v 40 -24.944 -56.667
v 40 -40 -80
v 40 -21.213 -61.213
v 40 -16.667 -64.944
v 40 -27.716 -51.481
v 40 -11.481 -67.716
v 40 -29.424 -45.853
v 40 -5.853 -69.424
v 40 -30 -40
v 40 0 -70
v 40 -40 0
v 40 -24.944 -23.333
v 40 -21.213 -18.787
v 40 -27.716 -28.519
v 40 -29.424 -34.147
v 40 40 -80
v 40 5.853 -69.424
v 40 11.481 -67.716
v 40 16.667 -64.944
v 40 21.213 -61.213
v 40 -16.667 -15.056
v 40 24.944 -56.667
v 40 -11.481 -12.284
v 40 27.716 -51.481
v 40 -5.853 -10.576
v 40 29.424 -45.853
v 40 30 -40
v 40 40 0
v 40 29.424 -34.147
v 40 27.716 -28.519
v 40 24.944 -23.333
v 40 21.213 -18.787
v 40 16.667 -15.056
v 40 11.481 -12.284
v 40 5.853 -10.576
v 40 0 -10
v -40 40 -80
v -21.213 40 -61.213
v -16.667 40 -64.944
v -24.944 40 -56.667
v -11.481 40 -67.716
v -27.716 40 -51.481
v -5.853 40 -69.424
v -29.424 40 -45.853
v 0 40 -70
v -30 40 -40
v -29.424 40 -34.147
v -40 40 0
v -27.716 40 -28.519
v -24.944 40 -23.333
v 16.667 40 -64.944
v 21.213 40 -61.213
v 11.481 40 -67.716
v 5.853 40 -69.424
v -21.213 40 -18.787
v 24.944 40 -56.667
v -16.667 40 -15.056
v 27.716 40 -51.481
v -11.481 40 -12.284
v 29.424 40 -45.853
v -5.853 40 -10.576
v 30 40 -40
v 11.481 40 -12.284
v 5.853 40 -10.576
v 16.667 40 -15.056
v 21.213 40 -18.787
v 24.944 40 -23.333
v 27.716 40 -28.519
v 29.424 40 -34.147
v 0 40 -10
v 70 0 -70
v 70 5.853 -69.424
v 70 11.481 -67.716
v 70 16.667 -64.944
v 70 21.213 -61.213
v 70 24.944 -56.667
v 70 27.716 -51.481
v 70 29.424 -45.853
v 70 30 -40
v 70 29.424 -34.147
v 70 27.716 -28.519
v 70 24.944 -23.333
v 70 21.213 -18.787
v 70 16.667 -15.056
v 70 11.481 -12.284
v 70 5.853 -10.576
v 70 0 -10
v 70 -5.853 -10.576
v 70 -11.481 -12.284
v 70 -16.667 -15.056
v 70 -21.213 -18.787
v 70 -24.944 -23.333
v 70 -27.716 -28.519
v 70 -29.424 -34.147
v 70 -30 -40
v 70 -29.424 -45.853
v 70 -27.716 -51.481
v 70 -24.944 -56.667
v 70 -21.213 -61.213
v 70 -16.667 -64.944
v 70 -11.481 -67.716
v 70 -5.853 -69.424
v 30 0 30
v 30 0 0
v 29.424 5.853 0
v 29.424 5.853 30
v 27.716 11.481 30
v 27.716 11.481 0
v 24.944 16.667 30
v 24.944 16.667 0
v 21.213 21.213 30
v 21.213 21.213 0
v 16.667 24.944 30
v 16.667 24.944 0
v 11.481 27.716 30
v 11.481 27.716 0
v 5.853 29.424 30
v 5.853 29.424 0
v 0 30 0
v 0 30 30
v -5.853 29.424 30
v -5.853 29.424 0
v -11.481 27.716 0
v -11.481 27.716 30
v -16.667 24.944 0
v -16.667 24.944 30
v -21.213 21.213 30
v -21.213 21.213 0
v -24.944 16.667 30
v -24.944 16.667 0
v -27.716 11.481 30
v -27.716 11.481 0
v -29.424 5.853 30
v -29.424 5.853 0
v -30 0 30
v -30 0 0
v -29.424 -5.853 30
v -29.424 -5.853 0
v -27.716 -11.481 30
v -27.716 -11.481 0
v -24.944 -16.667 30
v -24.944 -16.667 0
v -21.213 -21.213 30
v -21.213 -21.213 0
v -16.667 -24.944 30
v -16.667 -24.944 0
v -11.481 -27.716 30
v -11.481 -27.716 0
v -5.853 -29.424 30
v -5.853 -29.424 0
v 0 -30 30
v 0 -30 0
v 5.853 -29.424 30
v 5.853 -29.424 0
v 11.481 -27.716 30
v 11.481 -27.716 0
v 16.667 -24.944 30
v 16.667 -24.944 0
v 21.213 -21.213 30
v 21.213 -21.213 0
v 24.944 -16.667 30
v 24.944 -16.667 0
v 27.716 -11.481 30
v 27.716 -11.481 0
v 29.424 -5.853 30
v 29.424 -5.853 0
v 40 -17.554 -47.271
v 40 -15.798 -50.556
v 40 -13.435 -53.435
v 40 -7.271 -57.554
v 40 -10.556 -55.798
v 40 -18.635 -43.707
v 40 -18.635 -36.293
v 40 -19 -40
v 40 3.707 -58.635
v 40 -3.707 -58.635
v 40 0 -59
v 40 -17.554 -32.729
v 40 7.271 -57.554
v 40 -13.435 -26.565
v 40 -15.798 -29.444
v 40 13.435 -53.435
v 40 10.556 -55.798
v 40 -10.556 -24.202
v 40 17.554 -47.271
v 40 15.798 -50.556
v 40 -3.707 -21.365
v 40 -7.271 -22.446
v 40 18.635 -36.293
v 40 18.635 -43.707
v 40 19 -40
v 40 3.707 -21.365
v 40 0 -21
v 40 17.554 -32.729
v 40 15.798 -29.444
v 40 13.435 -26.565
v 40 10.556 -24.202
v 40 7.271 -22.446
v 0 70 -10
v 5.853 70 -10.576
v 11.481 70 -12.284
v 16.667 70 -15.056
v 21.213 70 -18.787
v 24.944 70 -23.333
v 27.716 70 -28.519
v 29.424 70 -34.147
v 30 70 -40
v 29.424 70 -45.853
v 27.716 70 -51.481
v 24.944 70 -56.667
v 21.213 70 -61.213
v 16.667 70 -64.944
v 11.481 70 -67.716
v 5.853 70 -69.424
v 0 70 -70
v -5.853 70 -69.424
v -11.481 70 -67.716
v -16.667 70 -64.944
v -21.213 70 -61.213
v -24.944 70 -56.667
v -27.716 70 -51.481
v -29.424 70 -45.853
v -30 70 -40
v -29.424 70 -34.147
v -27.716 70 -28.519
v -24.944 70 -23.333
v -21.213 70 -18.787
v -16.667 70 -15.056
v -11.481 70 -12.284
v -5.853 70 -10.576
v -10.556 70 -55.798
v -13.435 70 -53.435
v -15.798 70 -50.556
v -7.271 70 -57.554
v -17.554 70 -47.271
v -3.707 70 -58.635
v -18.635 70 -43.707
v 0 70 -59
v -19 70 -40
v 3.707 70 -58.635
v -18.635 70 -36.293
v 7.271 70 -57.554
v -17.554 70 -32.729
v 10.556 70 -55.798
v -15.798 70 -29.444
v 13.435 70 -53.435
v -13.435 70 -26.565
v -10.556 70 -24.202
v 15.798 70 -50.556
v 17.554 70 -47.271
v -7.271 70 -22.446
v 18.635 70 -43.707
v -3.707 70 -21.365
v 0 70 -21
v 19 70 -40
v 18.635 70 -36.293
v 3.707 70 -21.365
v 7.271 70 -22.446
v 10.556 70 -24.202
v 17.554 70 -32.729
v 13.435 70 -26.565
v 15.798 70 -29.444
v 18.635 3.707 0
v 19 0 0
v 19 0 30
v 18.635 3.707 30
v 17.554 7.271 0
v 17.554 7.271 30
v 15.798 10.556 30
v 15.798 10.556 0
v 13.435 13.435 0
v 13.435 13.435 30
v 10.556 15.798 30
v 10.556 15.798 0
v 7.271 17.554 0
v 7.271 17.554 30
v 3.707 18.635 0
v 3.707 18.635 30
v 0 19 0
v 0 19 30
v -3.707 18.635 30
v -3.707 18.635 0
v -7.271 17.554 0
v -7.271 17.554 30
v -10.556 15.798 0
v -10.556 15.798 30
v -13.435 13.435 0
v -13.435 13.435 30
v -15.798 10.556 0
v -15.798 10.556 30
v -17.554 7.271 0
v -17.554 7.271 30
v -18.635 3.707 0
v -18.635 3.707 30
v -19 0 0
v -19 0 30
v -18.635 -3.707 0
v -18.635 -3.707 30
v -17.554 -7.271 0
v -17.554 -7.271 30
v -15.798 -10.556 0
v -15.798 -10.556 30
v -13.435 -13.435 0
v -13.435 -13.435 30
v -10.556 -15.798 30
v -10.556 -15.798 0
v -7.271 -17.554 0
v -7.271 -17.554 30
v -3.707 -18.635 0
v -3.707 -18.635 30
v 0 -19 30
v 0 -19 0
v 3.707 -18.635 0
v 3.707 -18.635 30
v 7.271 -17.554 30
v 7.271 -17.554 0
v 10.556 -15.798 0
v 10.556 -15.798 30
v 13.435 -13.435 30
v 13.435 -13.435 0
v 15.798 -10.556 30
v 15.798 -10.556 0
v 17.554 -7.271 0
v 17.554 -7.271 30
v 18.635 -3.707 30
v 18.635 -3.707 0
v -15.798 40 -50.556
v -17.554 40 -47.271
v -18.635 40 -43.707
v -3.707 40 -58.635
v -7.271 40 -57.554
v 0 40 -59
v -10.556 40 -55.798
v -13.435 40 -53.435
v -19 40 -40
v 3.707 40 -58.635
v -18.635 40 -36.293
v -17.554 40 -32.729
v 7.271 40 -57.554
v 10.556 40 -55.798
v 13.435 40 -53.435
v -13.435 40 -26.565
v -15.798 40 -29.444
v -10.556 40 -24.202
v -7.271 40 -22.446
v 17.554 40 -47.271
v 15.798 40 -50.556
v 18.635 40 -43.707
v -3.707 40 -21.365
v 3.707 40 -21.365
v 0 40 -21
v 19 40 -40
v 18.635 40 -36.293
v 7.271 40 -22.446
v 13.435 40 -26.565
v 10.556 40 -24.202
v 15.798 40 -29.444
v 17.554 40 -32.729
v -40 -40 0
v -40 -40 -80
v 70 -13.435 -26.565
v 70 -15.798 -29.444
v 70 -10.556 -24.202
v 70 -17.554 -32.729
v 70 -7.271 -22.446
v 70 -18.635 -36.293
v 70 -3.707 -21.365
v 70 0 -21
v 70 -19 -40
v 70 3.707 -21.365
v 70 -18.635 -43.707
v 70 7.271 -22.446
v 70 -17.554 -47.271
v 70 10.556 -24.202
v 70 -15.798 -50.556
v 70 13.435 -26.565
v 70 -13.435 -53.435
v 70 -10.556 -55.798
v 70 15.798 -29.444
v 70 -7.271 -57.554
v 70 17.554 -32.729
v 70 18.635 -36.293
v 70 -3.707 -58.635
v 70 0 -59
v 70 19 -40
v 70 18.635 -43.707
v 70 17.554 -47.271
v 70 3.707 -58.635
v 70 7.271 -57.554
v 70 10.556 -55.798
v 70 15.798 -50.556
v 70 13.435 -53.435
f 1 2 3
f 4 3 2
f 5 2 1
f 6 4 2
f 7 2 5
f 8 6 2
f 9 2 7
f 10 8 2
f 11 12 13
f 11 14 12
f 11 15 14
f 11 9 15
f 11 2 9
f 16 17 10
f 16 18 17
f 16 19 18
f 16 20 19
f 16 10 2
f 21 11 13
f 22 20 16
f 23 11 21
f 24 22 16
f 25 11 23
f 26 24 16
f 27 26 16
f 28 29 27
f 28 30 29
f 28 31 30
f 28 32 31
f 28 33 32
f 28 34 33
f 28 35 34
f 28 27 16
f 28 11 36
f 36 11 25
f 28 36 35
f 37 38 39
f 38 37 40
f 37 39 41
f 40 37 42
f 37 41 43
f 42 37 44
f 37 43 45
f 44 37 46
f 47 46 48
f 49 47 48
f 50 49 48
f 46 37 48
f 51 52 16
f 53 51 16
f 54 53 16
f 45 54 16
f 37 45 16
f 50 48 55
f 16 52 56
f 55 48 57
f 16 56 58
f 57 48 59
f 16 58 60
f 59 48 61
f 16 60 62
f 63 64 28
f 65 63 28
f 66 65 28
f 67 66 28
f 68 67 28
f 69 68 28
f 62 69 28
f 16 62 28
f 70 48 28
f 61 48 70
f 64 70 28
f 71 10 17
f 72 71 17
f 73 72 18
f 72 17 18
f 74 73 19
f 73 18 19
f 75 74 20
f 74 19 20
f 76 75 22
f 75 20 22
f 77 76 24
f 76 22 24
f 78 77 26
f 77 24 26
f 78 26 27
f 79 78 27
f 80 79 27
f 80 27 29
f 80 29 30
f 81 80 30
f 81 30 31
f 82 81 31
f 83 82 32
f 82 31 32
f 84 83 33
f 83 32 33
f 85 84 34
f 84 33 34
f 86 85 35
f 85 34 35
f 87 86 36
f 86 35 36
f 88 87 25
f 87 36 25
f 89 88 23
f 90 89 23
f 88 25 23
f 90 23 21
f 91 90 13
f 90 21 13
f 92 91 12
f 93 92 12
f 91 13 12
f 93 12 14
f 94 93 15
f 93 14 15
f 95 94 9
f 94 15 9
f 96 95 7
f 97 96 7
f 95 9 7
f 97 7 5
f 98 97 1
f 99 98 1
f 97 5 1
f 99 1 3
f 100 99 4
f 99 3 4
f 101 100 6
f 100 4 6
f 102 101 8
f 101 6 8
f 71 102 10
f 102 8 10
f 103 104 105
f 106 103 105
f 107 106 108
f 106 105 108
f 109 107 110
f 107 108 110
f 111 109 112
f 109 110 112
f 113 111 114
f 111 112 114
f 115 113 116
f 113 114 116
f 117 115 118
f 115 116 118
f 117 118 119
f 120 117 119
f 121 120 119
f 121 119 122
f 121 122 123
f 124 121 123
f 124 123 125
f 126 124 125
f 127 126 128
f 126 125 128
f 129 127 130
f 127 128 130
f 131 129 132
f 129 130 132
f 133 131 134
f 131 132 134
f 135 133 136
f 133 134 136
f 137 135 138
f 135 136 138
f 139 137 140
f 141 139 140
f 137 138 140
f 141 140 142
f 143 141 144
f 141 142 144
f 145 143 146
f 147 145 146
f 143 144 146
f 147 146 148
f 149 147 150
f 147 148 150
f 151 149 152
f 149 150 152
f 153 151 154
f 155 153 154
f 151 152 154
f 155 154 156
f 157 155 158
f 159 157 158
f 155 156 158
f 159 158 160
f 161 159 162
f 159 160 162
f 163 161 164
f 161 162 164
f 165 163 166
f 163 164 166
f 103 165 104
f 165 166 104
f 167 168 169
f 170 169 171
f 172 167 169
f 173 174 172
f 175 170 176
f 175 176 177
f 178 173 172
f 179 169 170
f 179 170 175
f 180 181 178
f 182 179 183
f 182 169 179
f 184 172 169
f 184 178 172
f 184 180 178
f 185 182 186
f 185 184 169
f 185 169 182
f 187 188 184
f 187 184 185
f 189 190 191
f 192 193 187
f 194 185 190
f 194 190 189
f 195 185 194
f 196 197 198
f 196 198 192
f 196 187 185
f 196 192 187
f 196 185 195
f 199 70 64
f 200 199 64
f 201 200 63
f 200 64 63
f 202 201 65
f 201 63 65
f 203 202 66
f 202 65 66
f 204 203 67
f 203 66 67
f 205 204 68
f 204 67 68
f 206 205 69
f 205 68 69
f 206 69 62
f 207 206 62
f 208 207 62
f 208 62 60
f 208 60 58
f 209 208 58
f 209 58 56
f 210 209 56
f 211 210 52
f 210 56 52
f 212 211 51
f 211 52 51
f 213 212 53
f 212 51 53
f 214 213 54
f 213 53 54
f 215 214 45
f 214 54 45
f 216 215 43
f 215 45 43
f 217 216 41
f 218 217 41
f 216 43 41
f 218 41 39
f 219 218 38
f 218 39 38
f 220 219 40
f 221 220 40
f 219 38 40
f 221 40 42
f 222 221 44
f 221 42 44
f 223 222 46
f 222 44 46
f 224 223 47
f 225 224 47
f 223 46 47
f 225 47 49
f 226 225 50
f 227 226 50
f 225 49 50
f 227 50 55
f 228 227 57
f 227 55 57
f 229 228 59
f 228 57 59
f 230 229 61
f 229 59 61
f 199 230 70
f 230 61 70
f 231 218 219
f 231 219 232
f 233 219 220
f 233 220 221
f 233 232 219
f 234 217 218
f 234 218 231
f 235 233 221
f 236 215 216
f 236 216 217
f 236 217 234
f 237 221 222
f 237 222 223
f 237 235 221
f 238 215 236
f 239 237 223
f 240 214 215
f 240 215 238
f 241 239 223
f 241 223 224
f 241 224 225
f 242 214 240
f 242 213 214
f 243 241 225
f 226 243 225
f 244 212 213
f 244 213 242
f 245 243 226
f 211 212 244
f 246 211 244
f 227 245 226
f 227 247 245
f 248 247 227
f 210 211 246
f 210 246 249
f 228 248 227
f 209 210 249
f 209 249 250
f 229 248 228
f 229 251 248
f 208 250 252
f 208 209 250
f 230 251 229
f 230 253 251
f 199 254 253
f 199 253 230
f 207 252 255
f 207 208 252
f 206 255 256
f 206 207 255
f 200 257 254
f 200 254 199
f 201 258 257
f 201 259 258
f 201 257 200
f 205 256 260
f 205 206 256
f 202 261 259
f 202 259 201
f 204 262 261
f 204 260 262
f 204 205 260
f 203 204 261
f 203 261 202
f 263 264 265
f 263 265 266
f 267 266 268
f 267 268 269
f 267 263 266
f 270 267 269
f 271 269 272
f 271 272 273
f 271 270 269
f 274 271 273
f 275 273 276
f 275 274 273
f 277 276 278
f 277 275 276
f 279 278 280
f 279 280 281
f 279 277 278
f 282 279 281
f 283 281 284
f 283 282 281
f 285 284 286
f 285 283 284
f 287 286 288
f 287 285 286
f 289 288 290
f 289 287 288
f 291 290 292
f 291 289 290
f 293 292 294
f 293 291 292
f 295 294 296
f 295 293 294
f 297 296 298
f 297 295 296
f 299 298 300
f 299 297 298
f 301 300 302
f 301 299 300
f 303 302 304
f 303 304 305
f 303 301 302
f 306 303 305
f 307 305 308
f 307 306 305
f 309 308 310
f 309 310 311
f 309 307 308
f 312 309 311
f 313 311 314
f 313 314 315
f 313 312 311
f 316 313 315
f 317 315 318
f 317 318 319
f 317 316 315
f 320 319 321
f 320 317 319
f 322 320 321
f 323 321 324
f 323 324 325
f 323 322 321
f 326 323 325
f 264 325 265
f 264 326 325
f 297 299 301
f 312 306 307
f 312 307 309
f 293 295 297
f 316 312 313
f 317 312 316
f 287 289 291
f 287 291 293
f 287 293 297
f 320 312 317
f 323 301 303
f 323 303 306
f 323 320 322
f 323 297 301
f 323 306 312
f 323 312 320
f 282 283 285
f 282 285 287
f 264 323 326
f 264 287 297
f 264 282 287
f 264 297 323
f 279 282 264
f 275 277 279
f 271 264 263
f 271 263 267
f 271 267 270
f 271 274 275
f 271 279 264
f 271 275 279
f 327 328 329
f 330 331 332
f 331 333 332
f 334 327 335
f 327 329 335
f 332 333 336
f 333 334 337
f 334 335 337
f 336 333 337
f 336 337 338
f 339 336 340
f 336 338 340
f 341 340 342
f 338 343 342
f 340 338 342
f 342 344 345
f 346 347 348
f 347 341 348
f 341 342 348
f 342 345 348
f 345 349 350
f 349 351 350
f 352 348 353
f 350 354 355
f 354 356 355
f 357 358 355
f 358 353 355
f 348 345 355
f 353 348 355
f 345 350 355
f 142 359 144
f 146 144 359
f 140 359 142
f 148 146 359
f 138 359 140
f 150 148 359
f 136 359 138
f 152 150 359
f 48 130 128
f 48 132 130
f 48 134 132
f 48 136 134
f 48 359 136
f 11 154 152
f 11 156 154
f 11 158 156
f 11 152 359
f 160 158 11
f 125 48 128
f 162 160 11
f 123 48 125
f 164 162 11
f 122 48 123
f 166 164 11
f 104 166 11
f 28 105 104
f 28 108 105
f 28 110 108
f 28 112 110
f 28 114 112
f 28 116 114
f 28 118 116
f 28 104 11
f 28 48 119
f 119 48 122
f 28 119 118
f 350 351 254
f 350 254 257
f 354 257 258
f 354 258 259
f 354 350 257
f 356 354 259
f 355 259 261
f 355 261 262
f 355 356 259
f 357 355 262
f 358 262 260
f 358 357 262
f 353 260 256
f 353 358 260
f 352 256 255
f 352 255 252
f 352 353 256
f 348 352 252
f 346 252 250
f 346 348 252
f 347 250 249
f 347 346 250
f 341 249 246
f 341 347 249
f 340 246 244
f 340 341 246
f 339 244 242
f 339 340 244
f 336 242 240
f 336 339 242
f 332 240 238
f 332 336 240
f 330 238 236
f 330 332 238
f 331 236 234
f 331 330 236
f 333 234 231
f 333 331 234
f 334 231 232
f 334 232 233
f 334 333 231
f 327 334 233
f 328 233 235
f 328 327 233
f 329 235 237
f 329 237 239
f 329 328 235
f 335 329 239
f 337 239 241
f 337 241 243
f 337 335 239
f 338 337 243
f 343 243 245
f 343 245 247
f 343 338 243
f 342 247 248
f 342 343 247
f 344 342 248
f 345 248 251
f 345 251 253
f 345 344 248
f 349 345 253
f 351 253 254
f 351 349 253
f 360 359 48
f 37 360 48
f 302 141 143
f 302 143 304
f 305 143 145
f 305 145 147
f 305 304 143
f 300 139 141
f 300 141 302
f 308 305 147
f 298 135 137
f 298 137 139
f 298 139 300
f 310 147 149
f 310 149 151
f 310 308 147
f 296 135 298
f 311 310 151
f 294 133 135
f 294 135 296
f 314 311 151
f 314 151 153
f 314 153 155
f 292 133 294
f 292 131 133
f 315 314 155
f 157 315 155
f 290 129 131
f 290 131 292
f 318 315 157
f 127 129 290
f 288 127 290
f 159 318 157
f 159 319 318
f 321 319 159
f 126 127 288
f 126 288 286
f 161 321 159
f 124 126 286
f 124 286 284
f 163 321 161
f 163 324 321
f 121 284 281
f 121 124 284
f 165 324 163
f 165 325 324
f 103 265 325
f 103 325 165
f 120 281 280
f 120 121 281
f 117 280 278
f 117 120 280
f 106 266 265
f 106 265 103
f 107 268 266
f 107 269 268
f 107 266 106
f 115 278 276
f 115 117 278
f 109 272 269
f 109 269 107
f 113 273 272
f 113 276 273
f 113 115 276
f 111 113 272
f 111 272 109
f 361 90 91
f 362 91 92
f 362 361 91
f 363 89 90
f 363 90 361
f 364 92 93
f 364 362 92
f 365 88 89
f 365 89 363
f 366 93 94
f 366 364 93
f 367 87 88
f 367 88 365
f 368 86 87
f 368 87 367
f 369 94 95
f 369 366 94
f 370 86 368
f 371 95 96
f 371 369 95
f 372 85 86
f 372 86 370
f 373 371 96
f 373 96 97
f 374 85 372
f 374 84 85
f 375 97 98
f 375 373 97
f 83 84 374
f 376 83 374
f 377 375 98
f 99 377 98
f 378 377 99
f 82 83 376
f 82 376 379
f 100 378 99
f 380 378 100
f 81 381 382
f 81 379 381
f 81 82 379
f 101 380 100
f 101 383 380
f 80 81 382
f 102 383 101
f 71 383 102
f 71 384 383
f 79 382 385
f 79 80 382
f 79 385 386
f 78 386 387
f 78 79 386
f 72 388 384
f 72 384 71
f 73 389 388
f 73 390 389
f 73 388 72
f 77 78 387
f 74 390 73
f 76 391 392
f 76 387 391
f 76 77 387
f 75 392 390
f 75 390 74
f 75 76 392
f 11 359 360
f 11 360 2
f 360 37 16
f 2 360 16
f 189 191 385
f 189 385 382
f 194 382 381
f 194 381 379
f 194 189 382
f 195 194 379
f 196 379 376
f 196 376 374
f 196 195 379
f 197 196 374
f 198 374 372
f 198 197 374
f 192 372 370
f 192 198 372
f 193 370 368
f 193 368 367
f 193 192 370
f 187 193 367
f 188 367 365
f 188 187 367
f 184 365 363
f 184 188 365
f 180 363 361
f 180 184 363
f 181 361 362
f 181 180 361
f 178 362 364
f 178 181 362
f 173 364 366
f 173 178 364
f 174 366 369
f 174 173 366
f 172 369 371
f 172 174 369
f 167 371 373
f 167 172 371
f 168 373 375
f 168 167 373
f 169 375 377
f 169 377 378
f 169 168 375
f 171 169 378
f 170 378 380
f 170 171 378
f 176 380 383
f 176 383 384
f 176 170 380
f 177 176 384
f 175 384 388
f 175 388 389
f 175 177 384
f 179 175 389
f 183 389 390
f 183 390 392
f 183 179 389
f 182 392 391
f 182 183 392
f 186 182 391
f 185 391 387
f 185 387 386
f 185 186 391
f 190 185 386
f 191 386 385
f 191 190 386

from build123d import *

# Parameters (mm, degrees)
CROQUIS1_R              = 30
CROQUIS1_R_2            = 19
SALIENTE_EXTRUIR1_DEPTH = 30
CROQUIS2_W              = 80
CROQUIS2_H              = 80
SALIENTE_EXTRUIR2_DEPTH = 80
CROQUIS3_R              = 30
CROQUIS3_R_2            = 19
SALIENTE_EXTRUIR3_DEPTH = 30
CROQUIS4_R              = 30
CROQUIS4_R_2            = 19
SALIENTE_EXTRUIR4_DEPTH = 30


with BuildPart() as part:
    # Croquis1 → Saliente-Extruir1 (new body)
    with BuildSketch(Plane.XY):
        Circle(CROQUIS1_R)
        Circle(CROQUIS1_R_2, mode=Mode.SUBTRACT)
    extrude(amount=SALIENTE_EXTRUIR1_DEPTH)

    # Croquis2 → Saliente-Extruir2 (add)
    with BuildSketch(Plane.XY):
        Rectangle(CROQUIS2_W, CROQUIS2_H)
    extrude(amount=-SALIENTE_EXTRUIR2_DEPTH)

    # Croquis3 → Saliente-Extruir3 (add)
    with BuildSketch(Plane(origin=(40, 0, 0), x_dir=(0, 0, -1), z_dir=(1, 0, 0))):
        with Locations((40, 0)):
            Circle(CROQUIS3_R)
        with Locations(Location((40, 0, 0), (0, 0, 90))):
            Circle(CROQUIS3_R_2, mode=Mode.SUBTRACT)
    extrude(amount=SALIENTE_EXTRUIR3_DEPTH)

    # Croquis4 → Saliente-Extruir4 (add)
    with BuildSketch(Plane(origin=(0, 40, 0), x_dir=(1, 0, 0), z_dir=(0, 1, 0))):
        with Locations(Location((0, 40, 0), (0, 0, 270))):
            Circle(CROQUIS4_R)
        with Locations(Location((0, 40, 0), (0, 0, 270))):
            Circle(CROQUIS4_R_2, mode=Mode.SUBTRACT)
    extrude(amount=SALIENTE_EXTRUIR4_DEPTH)


solid = part.part
